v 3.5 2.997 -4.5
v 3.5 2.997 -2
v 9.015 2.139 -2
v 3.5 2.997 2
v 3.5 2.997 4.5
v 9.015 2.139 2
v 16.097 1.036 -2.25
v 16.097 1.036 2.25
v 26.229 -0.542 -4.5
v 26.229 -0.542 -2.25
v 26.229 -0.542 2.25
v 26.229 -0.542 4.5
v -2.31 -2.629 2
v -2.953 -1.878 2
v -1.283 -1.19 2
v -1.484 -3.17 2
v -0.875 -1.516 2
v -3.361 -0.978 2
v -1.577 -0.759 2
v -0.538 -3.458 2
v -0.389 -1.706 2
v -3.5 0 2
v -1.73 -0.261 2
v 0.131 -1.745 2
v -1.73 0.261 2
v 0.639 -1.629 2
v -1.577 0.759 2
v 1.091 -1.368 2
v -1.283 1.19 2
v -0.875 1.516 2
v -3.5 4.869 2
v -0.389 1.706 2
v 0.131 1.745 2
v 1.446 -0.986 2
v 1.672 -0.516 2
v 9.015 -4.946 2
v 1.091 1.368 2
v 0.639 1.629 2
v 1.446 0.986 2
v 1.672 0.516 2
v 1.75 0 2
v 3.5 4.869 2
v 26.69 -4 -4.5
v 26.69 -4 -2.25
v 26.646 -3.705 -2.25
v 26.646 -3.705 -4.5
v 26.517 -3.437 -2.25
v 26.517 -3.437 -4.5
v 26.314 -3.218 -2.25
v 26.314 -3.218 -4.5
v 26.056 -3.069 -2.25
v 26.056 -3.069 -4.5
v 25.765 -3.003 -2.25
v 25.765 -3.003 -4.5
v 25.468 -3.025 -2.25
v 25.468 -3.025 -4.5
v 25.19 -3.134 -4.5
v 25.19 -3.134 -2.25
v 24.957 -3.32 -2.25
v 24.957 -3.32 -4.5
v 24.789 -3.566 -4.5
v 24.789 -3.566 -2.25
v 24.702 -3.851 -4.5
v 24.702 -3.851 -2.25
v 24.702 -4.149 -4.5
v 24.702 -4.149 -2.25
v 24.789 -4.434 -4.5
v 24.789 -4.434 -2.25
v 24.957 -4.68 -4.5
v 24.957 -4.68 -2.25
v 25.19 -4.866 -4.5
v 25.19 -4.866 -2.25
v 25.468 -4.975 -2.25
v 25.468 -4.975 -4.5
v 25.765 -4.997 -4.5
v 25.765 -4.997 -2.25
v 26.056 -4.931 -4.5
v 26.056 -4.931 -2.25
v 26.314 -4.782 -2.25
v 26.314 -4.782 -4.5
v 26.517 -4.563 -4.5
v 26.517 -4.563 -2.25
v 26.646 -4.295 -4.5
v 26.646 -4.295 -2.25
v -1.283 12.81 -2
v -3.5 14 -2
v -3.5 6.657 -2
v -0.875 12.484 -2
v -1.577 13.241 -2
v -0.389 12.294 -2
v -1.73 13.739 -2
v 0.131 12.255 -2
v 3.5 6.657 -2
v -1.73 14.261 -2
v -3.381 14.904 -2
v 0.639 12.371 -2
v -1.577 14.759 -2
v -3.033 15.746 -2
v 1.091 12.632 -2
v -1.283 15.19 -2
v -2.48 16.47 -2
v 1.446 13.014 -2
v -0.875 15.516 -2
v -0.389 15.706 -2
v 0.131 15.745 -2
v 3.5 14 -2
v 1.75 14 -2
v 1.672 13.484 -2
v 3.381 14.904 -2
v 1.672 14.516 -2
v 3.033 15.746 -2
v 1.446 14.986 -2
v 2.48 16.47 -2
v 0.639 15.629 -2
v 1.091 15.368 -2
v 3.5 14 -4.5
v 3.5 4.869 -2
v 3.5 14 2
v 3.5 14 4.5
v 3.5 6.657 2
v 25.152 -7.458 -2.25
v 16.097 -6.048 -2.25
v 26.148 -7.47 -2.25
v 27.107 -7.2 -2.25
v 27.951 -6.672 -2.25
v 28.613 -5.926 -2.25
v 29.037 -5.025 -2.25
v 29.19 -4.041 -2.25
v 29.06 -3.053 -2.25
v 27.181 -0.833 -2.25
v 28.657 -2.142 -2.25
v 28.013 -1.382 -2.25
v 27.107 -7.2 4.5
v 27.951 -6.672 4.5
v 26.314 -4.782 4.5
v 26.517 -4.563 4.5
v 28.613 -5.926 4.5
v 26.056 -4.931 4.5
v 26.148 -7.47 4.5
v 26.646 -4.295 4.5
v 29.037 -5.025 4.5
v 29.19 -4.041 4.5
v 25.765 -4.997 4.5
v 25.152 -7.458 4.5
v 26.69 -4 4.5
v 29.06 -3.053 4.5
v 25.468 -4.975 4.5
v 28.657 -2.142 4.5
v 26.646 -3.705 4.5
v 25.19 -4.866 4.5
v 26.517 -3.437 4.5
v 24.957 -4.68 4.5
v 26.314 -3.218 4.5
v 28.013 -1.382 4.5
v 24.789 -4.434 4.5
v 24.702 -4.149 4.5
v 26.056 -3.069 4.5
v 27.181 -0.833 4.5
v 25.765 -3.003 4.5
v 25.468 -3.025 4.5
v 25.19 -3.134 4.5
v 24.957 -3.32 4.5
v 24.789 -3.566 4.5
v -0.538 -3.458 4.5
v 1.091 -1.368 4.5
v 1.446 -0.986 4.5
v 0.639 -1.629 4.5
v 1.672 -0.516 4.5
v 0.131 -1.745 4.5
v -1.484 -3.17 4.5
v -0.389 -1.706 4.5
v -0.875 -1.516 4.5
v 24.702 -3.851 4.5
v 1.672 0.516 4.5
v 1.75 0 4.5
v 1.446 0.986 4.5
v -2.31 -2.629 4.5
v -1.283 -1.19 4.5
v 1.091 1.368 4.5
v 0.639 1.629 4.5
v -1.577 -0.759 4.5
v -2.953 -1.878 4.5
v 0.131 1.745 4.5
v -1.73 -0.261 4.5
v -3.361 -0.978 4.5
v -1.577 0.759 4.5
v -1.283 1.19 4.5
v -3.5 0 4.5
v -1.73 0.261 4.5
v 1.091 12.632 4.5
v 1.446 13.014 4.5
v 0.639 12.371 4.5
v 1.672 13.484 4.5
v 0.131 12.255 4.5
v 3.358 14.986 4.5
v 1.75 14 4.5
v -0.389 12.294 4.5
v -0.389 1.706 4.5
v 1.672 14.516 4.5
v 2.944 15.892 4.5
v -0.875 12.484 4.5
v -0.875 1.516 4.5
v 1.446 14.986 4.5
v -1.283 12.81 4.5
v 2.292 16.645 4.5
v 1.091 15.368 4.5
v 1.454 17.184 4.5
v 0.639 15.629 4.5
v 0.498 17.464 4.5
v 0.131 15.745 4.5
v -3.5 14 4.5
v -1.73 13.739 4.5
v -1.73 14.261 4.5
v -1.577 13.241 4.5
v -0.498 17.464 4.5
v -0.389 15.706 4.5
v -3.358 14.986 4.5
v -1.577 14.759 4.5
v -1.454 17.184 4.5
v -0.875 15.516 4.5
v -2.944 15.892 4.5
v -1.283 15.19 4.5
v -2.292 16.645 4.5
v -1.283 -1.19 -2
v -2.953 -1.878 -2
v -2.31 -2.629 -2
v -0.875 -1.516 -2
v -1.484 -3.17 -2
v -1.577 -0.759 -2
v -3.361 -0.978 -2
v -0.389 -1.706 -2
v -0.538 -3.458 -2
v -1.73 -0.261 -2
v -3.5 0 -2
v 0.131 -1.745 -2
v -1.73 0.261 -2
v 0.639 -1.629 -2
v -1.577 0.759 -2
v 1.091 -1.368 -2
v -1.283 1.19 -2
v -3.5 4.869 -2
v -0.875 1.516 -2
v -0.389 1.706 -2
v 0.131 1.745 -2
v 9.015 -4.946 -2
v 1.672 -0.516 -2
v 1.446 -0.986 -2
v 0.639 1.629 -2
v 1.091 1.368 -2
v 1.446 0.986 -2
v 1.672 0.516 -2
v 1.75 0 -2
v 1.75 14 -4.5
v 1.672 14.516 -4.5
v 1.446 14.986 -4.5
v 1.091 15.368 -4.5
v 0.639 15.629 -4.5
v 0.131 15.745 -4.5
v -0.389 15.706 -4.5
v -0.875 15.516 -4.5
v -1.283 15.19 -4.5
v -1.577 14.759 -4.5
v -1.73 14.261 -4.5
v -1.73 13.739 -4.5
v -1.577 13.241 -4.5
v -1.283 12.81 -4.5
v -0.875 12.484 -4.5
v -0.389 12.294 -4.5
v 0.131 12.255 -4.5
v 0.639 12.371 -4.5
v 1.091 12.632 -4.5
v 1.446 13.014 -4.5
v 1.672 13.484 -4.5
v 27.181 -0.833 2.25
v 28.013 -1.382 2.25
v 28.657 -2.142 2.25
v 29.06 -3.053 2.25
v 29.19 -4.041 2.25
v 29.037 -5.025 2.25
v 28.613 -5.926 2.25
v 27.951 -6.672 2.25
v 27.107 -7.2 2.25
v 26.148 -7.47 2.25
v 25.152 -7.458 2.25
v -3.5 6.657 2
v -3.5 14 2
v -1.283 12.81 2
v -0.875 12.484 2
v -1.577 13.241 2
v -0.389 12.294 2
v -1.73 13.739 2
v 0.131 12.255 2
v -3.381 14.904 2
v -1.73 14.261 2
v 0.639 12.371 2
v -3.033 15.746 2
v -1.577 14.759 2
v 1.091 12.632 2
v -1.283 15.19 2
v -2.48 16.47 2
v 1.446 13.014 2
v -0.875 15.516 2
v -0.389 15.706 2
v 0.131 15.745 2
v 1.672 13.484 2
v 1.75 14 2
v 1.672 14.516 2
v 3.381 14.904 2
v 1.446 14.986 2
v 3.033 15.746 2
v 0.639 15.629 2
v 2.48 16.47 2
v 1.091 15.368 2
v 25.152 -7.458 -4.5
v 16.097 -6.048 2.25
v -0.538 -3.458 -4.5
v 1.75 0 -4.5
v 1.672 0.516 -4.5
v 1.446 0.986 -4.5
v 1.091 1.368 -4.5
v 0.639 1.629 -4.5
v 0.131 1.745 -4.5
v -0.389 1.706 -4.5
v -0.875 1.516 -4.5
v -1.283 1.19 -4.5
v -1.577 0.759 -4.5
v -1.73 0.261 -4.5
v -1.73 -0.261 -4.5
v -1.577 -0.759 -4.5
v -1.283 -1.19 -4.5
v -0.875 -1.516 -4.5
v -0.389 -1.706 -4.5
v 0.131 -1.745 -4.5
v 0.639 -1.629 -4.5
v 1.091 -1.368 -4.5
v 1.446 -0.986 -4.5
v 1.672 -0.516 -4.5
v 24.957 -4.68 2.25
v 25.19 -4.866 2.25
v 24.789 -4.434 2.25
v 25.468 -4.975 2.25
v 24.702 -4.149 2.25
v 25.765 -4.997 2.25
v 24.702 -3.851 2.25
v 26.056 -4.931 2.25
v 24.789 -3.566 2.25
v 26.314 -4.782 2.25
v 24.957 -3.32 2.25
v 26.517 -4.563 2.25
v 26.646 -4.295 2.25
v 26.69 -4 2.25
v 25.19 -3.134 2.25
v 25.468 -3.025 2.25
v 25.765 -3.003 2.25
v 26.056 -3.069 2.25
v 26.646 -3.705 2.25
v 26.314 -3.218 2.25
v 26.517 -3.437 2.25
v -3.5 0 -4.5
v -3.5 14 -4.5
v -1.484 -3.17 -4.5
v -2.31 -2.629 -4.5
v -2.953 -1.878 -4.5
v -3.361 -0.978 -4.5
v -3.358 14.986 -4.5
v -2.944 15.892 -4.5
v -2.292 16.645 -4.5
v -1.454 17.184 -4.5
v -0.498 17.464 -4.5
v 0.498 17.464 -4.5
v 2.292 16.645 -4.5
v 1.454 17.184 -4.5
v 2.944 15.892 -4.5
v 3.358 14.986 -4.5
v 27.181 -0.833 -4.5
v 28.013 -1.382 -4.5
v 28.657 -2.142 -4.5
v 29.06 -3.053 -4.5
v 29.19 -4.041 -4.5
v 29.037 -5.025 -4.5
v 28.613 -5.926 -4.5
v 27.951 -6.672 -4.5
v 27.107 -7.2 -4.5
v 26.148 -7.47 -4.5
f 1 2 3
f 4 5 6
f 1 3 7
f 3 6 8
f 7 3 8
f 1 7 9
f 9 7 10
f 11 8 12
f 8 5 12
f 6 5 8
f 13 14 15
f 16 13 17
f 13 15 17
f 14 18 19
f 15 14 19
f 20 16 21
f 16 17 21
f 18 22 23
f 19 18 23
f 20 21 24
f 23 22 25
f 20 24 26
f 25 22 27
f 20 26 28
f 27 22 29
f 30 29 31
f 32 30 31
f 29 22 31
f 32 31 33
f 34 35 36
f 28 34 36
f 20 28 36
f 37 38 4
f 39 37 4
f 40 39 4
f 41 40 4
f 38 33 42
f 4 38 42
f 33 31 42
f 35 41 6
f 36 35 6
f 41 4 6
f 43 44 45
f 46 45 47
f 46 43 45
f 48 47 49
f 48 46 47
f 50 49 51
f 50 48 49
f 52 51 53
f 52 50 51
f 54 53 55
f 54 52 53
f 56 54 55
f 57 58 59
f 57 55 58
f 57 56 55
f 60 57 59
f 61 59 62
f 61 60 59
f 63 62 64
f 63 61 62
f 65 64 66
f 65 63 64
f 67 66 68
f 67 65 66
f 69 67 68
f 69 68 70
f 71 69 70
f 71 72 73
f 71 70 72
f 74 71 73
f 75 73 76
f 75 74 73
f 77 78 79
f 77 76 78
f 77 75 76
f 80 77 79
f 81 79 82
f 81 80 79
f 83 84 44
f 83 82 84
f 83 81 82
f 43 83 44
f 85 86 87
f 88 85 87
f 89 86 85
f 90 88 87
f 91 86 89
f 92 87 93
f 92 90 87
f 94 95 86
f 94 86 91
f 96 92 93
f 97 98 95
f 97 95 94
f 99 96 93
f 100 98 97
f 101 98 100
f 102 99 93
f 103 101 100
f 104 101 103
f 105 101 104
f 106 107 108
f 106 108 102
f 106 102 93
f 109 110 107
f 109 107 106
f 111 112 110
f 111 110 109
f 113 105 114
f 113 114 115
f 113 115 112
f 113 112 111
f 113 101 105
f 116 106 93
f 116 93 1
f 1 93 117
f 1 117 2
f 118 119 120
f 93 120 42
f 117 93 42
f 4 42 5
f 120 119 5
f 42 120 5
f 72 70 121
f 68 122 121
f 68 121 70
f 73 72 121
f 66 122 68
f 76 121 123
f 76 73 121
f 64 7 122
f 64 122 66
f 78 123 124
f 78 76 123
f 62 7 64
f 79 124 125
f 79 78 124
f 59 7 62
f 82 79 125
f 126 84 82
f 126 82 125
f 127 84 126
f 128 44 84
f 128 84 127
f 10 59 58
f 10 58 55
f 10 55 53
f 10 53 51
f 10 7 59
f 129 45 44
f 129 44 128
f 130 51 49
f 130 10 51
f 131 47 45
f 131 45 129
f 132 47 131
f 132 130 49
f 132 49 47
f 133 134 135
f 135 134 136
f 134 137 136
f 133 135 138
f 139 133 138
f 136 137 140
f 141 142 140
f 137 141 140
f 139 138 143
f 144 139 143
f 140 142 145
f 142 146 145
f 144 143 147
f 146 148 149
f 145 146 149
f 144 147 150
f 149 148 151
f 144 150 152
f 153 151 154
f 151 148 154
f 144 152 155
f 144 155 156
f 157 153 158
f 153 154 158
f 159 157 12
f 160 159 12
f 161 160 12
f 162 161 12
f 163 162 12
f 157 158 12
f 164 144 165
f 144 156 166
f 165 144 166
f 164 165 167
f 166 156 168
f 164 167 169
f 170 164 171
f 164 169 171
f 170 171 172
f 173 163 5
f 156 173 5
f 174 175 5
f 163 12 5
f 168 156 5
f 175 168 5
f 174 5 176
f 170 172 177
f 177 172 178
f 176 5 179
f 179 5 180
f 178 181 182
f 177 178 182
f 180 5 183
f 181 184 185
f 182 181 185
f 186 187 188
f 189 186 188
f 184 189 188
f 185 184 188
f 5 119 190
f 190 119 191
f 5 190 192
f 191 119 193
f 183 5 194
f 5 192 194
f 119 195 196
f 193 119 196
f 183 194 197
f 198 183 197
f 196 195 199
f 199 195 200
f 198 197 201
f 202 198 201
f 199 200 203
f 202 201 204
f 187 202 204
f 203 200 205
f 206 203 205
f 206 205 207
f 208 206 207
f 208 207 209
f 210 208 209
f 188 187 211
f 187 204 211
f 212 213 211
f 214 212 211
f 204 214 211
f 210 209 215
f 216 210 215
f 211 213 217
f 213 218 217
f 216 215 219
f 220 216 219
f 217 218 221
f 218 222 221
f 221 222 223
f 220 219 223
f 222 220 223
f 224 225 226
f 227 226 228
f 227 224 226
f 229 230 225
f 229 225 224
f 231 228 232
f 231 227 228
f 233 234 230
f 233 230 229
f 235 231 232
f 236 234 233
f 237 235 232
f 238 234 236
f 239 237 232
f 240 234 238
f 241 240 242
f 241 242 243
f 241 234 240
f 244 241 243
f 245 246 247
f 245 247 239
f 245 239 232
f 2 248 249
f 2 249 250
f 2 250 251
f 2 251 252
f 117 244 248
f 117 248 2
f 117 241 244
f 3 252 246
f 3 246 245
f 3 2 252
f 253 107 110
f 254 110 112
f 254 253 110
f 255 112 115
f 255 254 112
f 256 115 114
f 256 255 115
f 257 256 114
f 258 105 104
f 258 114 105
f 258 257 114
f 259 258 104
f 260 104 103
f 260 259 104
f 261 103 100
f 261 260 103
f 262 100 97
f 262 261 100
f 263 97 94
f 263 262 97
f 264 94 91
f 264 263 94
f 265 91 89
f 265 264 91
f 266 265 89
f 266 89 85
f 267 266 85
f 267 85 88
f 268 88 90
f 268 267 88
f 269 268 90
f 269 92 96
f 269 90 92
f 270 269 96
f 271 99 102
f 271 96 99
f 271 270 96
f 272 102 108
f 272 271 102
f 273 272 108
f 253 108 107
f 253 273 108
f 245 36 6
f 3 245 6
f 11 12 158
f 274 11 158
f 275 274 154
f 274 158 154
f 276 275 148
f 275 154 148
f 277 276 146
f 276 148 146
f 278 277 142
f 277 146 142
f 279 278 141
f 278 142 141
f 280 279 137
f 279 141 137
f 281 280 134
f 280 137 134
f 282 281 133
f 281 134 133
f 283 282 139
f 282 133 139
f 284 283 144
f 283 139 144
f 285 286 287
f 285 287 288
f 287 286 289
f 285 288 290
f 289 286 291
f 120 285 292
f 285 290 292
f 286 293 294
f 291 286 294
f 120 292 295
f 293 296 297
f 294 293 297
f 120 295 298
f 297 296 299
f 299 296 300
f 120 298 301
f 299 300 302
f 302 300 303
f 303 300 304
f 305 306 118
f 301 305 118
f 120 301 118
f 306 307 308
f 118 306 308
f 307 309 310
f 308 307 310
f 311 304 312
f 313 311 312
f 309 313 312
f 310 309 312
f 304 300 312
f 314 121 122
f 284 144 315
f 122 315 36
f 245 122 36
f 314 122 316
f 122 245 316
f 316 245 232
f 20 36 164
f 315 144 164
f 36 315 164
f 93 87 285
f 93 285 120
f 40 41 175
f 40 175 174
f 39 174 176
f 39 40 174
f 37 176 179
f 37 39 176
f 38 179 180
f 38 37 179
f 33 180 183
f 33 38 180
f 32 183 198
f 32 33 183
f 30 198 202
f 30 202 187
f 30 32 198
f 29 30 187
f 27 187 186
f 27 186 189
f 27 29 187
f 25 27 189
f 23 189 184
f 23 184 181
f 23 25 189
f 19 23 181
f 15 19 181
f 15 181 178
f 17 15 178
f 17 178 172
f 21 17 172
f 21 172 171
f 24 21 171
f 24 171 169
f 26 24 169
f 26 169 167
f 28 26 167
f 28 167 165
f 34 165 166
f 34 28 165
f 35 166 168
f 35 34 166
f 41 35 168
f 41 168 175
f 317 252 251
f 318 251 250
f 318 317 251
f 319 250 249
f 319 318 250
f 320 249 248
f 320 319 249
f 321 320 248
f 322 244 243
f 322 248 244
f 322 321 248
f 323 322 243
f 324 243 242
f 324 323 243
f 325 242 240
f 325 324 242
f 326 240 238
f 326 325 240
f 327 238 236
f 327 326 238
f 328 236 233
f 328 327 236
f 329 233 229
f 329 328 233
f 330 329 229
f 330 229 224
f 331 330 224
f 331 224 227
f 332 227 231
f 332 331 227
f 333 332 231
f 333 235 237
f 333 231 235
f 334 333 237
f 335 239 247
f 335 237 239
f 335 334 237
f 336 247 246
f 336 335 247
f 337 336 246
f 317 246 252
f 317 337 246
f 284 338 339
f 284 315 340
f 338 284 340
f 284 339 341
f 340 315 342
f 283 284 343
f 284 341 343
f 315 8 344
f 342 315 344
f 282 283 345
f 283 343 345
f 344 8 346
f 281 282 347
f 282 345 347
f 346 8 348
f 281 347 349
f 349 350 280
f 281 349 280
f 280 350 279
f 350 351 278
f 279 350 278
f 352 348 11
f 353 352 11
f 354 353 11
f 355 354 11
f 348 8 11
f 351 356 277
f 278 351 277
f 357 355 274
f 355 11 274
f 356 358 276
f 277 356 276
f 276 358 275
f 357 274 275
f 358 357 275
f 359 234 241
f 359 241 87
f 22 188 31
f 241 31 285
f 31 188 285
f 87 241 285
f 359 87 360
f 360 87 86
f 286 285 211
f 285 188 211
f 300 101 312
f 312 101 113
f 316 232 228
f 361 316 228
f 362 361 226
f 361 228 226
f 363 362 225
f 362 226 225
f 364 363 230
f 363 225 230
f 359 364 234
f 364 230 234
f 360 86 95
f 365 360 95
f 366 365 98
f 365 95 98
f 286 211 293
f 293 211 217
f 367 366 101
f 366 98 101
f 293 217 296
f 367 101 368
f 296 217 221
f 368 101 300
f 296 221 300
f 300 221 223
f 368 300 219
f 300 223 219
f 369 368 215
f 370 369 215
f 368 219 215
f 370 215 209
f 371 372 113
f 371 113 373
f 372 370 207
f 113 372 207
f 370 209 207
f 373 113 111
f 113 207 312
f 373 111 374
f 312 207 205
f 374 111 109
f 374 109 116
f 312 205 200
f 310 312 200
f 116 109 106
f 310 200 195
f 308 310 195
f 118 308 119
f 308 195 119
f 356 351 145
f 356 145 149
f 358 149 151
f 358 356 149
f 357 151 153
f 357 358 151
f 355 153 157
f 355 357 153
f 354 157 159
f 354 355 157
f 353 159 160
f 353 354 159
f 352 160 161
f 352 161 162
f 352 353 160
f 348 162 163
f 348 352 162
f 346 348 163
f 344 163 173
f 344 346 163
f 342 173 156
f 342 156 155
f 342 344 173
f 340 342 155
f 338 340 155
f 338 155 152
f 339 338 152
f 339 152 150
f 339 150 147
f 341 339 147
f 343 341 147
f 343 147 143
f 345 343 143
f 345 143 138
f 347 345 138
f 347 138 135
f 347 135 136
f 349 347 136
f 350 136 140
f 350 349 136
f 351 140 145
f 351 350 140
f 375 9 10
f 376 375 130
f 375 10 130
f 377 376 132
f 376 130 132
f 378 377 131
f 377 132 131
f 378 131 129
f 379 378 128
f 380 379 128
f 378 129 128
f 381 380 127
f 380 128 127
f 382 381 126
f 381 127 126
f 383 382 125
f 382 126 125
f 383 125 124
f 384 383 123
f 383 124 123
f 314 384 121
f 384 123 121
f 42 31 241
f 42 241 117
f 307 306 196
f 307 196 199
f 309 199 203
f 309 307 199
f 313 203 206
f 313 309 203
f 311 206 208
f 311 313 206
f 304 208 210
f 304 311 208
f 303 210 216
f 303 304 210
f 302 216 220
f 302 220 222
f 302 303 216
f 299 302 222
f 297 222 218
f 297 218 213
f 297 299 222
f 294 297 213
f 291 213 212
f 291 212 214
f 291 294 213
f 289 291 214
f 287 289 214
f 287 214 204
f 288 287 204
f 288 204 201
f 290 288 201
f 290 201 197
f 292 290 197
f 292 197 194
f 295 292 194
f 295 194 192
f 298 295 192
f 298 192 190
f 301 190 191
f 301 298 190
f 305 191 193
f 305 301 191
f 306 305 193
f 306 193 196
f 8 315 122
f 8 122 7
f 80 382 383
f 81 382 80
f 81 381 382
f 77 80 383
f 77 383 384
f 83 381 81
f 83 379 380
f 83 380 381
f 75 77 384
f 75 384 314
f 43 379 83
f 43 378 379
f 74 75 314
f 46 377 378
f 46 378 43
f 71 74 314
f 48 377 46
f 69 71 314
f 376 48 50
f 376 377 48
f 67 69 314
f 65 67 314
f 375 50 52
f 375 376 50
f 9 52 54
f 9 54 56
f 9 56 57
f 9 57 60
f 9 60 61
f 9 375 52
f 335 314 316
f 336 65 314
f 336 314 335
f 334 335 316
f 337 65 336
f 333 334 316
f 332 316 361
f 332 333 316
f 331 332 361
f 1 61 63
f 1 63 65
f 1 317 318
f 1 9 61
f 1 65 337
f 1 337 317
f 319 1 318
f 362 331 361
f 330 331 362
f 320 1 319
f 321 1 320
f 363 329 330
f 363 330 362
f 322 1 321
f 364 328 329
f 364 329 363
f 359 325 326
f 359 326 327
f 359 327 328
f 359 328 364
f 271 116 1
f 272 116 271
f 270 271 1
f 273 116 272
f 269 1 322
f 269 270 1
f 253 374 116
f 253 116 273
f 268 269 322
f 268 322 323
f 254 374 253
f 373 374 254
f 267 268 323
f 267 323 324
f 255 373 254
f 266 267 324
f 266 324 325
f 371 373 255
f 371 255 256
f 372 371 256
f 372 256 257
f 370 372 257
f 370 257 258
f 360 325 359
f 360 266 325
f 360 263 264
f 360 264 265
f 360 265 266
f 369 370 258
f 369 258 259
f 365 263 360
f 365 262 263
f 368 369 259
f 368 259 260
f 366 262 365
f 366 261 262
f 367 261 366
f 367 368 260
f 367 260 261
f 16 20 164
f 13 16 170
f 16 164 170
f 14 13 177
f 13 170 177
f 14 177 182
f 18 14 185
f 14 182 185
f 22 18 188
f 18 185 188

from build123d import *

# Parameters (mm, degrees)
SKETCH_1_R          = 1.75
SKETCH_1_R_2        = 1
EXTRUDE_1_DEPTH     = 4.5
SKETCH_5_W          = 9.199682462
SKETCH_5_H          = 9.813167506
SKETCH_5_W_2        = 14.660354758
SKETCH_5_H_2        = 10.525453646
CUT_EXTRUDE_3_DEPTH = 2
SKETCH_6_W          = 19.186818514
SKETCH_6_H          = 12
CUT_EXTRUDE_4_DEPTH = 2.25


with BuildPart() as part:
    # 草图1 → 凸台-拉伸1 (new, symmetric)
    with BuildSketch(Plane.XY):
        with BuildLine():
            Line((25.152003619, -7.458331848), (-0.538461538, -3.458331848))
            ThreePointArc((-0.538461538, -3.458331848), (-2.658440839, -2.276552725), (-3.5, 0))
            Line((-3.5, 0), (-3.5, 14))
            ThreePointArc((-3.5, 14), (0, 17.5), (3.5, 14))
            Line((3.5, 14), (3.5, 2.997220935))
            Line((3.5, 2.997220935), (26.228926696, -0.541668152))
            ThreePointArc((26.228926696, -0.541668152), (29.148797005, -4.538461538), (25.152003619, -7.458331848))
        make_face()
        Circle(SKETCH_1_R, mode=Mode.SUBTRACT)
        with Locations((0, 14)):
            Circle(SKETCH_1_R, mode=Mode.SUBTRACT)
        with Locations((25.690465157, -4)):
            Circle(SKETCH_1_R_2, mode=Mode.SUBTRACT)
    extrude(amount=EXTRUDE_1_DEPTH, both=True)

    # 草图5 → 切除-拉伸3 (cut, symmetric)
    with BuildSketch(Plane.XY):
        with Locations((-1.099841231, 11.563279791)):
            Rectangle(SKETCH_5_W, SKETCH_5_H)
        with Locations((1.684655549, -0.393377614)):
            Rectangle(SKETCH_5_W_2, SKETCH_5_H_2)
    extrude(amount=CUT_EXTRUDE_3_DEPTH, both=True, mode=Mode.SUBTRACT)

    # 草图6 → 切除-拉伸4 (cut, symmetric)
    with BuildSketch(Plane.XY):
        with Locations((25.690465157, -4)):
            Rectangle(SKETCH_6_W, SKETCH_6_H)
    extrude(amount=CUT_EXTRUDE_4_DEPTH, both=True, mode=Mode.SUBTRACT)


solid = part.part
